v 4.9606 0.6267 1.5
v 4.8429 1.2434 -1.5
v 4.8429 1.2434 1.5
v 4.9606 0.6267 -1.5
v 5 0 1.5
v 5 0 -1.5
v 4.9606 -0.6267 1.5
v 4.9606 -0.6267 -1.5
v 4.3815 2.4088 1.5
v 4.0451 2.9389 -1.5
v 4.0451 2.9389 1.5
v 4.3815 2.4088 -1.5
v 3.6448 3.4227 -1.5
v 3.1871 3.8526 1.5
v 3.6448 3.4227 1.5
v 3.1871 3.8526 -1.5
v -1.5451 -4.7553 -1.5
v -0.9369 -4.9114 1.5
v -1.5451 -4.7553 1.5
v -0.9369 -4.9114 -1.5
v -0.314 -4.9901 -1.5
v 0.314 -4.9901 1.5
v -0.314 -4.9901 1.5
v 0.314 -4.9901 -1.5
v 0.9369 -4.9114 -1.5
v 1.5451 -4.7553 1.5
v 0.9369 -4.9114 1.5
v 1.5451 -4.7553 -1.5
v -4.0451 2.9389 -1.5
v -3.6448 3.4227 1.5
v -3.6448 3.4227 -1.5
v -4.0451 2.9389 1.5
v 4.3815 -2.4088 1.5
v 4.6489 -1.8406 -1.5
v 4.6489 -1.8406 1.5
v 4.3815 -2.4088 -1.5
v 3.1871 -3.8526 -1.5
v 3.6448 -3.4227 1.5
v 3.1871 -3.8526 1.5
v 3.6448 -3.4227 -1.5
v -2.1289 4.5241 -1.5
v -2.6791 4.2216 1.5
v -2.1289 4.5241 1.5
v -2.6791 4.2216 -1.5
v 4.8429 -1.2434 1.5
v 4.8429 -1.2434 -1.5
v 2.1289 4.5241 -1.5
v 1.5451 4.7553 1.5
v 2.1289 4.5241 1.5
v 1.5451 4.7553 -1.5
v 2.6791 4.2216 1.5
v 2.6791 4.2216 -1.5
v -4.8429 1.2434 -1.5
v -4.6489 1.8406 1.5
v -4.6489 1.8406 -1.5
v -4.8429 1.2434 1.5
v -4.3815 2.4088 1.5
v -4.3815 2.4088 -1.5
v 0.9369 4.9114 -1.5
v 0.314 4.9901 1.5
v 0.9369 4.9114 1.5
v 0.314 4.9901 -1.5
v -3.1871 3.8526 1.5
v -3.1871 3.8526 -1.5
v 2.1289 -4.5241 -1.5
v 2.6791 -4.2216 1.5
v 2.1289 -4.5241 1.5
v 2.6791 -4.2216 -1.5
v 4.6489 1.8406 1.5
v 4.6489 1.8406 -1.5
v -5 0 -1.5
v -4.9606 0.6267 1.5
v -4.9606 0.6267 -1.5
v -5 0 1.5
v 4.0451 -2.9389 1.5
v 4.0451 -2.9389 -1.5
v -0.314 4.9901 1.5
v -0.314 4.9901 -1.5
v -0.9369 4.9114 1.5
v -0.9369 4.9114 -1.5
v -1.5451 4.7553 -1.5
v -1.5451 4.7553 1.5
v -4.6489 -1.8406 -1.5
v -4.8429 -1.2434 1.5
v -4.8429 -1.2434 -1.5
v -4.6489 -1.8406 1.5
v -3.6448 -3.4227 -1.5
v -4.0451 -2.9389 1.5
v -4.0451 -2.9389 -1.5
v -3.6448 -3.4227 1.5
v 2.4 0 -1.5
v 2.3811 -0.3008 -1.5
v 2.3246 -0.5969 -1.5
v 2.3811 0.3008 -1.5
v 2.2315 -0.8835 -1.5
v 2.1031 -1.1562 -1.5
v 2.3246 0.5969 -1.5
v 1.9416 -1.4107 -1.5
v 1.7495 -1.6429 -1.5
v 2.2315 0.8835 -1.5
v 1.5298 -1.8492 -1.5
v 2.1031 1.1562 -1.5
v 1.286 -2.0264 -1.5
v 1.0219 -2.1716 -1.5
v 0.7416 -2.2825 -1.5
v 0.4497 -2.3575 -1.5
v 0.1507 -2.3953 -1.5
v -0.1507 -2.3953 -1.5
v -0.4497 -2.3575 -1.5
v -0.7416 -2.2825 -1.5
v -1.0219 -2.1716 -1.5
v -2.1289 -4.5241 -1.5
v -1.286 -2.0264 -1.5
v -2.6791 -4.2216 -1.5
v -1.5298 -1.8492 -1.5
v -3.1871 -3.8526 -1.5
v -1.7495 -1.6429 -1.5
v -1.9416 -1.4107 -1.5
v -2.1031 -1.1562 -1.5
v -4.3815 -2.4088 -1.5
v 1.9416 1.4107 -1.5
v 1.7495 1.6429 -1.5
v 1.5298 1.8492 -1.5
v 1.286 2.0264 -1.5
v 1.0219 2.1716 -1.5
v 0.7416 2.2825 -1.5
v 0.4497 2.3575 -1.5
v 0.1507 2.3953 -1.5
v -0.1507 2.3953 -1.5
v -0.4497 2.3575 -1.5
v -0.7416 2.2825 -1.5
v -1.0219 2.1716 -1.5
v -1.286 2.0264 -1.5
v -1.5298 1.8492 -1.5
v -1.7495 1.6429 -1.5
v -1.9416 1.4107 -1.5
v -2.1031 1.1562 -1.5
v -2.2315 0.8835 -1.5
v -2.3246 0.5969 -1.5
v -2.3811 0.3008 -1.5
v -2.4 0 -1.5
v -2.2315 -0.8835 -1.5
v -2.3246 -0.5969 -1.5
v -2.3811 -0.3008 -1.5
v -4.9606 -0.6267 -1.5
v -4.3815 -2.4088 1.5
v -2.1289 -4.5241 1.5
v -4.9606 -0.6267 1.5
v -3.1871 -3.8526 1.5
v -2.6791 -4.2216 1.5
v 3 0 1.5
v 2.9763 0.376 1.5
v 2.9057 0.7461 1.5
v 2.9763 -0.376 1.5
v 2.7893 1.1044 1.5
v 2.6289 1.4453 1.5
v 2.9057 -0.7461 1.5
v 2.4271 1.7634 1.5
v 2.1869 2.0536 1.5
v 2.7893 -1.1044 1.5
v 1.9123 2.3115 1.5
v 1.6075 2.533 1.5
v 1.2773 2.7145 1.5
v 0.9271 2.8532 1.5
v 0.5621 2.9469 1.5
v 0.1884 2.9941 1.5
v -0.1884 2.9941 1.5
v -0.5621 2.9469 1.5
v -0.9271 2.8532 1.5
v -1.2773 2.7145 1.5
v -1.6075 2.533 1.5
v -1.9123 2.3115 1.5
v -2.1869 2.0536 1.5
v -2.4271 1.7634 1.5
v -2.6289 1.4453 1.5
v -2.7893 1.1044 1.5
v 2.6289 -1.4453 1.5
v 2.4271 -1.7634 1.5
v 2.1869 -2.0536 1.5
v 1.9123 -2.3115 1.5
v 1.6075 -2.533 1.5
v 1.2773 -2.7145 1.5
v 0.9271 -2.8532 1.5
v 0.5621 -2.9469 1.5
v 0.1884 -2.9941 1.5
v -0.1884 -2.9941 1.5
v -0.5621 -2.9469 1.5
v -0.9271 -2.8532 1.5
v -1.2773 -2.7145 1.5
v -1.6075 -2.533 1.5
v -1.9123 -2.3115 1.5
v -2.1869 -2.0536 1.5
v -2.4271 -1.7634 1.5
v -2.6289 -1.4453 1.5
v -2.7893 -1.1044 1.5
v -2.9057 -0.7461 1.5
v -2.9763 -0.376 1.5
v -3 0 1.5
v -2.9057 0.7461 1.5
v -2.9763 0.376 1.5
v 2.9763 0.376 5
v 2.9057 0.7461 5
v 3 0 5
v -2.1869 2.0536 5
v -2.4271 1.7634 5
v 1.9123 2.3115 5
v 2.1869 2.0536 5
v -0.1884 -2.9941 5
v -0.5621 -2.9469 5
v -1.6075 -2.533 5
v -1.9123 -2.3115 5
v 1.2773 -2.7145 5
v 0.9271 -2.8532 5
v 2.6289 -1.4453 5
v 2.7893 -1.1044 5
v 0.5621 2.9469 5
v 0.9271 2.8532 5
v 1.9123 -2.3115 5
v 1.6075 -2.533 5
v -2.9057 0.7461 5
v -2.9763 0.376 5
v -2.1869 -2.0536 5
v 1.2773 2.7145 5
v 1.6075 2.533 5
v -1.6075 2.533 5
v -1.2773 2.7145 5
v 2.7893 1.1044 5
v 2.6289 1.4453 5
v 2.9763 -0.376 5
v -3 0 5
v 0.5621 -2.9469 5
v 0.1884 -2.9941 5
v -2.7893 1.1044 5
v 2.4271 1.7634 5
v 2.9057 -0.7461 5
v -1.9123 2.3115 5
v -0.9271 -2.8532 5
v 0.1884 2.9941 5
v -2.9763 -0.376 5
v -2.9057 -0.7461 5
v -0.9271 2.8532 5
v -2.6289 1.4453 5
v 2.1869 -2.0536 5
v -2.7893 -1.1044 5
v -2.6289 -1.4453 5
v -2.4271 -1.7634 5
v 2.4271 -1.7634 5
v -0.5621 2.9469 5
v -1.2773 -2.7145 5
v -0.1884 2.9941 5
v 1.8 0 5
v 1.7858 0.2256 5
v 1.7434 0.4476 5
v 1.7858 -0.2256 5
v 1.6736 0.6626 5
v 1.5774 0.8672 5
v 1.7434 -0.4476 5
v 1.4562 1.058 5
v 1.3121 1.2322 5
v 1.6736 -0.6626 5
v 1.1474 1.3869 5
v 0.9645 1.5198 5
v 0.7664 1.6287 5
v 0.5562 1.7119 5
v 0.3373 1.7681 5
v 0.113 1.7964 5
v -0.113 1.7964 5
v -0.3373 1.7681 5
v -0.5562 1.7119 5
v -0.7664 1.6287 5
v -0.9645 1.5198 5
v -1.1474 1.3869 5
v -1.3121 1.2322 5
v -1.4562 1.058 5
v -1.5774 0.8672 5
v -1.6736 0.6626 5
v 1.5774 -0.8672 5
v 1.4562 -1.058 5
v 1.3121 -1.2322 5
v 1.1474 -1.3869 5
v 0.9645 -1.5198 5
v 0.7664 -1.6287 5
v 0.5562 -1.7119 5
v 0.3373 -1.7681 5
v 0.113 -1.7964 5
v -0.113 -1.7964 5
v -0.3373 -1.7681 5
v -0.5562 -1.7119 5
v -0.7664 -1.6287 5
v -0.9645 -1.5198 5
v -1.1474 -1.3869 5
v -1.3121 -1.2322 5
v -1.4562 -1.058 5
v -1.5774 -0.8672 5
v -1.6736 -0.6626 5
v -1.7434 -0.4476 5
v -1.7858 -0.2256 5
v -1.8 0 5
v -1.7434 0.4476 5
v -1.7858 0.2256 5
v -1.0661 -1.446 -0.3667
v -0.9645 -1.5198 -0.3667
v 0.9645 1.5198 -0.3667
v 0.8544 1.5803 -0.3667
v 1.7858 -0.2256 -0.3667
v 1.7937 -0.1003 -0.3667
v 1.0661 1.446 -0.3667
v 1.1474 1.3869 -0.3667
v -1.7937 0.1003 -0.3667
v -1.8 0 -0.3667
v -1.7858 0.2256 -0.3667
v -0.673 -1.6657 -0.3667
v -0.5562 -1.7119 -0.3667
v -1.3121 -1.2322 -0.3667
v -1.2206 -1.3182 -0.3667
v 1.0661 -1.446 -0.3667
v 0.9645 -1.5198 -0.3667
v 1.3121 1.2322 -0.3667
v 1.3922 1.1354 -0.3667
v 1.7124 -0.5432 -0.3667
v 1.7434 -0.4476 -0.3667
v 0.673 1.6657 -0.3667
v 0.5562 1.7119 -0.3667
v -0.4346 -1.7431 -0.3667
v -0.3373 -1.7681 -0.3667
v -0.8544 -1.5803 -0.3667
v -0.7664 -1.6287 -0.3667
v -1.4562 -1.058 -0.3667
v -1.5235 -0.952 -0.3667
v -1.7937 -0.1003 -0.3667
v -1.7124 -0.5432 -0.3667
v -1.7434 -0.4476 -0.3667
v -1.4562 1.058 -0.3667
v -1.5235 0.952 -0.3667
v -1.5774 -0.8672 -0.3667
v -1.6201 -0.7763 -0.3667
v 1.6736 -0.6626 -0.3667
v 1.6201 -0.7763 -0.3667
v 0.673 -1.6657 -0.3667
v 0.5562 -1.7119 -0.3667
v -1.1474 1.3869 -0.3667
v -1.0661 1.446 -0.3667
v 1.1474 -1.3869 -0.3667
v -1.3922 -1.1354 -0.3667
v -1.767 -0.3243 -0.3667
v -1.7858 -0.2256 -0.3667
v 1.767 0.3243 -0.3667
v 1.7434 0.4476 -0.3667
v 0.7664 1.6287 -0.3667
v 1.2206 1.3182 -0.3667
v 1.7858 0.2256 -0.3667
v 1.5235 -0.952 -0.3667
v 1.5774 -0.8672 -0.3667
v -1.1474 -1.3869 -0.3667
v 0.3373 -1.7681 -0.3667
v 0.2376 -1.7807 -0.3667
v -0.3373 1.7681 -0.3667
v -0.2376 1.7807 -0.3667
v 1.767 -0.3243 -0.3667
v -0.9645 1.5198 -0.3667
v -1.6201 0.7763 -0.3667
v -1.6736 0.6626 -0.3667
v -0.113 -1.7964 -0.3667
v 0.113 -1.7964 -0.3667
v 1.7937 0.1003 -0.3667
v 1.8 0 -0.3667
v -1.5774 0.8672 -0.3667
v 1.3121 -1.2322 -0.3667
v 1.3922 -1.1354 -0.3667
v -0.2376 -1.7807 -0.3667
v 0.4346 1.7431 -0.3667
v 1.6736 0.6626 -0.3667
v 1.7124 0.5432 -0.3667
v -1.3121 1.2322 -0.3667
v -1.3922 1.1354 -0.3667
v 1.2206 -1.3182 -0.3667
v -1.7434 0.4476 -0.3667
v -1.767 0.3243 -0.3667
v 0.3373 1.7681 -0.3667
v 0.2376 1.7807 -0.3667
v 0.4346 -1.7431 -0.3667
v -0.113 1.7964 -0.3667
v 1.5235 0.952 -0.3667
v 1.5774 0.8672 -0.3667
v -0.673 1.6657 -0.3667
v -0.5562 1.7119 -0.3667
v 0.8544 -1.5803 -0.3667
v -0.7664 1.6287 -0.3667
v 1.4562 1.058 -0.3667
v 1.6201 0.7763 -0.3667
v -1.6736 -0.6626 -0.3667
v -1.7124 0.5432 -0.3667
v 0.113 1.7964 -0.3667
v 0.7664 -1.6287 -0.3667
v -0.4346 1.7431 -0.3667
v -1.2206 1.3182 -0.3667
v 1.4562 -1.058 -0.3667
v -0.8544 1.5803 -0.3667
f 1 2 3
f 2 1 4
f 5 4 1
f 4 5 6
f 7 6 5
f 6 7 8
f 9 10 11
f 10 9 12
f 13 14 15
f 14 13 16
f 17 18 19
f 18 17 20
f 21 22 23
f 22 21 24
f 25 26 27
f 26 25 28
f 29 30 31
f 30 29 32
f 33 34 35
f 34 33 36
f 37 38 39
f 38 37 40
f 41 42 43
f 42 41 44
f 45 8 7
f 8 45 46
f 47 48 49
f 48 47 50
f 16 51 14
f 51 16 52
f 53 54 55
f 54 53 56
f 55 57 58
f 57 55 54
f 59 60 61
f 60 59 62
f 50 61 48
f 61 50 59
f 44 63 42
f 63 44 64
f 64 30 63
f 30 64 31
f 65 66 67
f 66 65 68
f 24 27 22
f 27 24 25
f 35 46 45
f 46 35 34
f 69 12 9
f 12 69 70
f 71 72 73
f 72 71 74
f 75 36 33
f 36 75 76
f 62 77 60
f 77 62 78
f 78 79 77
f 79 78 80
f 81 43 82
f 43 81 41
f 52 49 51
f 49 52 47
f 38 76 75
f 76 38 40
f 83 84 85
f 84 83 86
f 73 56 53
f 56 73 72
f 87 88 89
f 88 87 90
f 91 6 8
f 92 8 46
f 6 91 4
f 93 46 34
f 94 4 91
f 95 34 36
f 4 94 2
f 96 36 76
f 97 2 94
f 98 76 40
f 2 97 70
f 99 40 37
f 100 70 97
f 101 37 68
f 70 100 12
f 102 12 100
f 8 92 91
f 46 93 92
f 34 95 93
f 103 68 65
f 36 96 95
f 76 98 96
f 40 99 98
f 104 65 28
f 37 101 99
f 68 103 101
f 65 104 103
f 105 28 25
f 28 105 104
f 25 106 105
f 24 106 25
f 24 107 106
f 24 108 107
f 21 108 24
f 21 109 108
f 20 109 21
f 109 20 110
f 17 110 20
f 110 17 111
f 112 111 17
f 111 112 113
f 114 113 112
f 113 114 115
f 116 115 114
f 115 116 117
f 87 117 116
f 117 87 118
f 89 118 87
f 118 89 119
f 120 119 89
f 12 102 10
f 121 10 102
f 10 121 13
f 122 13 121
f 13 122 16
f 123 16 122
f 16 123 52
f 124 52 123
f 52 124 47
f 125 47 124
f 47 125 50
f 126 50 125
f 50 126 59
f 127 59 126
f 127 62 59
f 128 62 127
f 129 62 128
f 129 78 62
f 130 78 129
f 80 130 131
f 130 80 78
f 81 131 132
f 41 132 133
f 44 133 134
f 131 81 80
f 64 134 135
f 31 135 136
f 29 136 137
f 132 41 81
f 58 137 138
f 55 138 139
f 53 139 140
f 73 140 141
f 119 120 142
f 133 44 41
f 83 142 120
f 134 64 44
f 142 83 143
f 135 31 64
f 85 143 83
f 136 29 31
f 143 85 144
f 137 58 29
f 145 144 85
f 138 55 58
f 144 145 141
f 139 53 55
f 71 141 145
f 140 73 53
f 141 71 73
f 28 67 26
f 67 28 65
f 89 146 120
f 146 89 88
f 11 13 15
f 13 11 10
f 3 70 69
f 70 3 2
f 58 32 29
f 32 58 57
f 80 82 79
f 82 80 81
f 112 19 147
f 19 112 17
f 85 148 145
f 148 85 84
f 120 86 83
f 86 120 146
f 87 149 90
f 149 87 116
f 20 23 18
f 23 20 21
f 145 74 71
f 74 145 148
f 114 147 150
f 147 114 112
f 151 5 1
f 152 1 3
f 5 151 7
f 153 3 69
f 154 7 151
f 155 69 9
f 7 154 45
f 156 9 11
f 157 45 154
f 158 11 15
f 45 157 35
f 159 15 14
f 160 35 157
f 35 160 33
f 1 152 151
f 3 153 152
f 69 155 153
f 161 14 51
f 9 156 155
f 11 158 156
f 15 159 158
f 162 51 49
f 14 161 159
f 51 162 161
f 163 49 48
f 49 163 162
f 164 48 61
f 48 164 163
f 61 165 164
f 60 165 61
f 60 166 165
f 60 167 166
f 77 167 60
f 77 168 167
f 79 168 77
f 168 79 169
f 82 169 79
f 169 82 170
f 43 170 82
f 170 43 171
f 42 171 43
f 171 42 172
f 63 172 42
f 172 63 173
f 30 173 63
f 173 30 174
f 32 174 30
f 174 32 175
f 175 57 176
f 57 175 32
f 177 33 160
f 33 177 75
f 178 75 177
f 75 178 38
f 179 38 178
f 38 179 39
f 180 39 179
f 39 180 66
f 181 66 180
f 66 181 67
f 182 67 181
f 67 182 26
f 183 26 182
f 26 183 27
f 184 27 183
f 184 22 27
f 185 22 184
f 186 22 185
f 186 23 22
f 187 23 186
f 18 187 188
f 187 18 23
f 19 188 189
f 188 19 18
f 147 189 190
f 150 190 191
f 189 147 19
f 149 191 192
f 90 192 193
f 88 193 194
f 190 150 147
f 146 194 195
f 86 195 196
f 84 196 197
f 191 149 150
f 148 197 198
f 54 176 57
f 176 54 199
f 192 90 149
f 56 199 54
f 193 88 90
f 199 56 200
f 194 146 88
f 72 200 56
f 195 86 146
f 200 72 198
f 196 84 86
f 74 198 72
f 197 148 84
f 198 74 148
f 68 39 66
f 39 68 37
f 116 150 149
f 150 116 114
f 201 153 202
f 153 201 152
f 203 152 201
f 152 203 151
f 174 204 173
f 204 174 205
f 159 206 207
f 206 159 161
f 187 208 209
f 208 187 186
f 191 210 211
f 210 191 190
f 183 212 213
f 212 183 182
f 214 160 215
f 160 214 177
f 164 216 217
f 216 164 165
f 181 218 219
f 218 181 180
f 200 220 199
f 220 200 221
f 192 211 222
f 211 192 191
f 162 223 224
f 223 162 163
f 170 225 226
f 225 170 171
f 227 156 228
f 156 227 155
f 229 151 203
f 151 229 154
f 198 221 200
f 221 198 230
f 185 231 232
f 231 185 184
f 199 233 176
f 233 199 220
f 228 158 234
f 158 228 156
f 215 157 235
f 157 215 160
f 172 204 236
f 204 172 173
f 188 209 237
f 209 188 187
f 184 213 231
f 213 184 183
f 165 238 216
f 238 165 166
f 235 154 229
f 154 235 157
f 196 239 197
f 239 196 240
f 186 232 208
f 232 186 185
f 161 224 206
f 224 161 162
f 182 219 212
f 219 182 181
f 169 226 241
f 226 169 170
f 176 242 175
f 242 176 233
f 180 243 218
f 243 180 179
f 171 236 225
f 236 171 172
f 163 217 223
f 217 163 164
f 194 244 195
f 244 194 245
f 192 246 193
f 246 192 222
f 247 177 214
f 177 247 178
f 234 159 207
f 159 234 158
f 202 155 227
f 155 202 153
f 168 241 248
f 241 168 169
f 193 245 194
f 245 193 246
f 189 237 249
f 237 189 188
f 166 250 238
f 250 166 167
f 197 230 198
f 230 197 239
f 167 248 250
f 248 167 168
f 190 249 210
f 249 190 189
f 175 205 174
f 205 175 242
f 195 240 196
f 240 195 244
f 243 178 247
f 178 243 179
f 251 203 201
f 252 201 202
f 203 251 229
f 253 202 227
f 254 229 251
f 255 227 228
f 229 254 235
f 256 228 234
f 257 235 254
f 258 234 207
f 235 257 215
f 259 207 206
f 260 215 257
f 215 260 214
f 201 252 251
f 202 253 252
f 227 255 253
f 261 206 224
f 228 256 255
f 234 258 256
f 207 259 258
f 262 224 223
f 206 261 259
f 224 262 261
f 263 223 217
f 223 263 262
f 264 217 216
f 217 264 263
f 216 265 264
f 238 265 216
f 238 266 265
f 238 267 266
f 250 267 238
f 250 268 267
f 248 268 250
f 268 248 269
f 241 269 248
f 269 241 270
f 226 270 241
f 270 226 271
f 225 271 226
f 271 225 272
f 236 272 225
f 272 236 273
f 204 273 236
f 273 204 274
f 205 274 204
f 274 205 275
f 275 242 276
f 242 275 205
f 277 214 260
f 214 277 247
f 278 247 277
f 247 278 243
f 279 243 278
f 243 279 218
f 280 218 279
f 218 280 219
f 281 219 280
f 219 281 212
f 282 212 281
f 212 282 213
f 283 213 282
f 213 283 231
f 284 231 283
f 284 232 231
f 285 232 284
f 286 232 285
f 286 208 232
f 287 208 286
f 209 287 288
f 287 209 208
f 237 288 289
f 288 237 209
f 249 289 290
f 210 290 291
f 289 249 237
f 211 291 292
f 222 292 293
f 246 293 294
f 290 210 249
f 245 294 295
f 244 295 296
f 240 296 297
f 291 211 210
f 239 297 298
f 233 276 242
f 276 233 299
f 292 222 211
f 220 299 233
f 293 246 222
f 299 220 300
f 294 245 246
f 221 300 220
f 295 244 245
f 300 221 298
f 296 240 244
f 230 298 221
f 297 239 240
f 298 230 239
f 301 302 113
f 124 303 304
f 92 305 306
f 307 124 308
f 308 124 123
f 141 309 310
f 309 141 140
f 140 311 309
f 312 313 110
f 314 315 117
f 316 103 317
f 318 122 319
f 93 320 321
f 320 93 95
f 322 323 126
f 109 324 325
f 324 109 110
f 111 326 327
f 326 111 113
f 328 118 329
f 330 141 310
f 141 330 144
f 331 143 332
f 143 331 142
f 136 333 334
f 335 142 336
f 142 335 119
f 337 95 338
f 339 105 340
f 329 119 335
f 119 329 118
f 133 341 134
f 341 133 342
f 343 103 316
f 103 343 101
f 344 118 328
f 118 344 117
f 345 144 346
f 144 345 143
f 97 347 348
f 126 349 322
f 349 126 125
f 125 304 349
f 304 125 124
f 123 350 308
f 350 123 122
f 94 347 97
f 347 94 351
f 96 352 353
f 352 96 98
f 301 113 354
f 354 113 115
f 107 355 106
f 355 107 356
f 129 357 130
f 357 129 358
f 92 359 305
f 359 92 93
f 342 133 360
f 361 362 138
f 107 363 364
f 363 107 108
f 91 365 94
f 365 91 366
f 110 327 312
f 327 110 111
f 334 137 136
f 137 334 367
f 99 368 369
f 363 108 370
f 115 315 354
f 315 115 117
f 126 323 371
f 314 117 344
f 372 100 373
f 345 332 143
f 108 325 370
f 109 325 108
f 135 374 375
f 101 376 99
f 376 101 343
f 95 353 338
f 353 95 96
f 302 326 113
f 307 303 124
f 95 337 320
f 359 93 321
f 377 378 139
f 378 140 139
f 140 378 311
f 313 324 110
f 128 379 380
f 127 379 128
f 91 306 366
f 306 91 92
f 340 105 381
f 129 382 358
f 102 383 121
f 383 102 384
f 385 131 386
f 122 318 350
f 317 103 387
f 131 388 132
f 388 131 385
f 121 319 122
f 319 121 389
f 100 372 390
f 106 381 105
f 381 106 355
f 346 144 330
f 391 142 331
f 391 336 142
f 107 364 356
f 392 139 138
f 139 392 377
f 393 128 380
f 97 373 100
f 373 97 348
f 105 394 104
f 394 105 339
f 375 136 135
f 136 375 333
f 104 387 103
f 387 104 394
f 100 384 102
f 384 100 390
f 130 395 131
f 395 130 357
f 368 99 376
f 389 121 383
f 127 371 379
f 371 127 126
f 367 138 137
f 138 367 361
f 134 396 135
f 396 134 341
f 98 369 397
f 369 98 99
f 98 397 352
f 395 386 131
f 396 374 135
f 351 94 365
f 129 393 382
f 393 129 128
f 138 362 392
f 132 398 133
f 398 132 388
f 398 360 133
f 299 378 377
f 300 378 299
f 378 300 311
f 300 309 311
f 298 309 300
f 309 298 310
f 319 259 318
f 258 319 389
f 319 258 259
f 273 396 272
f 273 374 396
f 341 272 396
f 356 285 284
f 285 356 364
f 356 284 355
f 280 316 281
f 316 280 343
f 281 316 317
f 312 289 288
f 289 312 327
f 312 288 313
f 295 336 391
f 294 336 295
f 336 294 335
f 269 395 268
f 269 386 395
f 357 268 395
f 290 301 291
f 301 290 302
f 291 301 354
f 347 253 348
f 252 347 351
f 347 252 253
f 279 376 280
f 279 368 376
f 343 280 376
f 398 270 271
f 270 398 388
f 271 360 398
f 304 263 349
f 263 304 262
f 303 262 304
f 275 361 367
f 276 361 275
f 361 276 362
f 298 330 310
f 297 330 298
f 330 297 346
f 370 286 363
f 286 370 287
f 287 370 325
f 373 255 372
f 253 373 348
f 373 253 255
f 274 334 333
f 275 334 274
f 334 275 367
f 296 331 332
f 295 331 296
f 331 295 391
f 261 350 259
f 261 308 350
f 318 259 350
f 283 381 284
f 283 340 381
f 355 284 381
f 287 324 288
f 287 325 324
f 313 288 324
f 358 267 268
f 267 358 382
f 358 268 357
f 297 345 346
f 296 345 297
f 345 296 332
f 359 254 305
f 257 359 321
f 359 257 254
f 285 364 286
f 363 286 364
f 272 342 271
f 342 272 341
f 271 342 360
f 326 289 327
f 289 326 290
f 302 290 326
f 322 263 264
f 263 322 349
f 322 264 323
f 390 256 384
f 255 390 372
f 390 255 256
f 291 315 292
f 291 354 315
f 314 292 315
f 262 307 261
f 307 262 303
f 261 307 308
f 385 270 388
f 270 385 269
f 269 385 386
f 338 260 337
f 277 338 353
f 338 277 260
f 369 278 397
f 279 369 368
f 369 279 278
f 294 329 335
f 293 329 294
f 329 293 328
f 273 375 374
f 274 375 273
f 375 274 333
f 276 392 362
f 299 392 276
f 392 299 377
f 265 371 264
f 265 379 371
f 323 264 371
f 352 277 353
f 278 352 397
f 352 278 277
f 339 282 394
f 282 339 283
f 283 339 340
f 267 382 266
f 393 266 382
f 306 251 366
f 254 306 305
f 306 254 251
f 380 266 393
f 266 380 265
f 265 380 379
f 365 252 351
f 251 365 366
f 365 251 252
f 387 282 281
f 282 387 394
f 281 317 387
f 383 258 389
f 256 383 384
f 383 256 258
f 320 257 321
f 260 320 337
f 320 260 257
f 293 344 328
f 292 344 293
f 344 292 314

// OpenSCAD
$fn = 50;


difference() {
	union() {
		translate(v = [0, 0, -1.5000000000]) {
			cylinder(h = 3, r = 5.0000000000);
		}
		translate(v = [0, 0, -1.5000000000]) {
			cylinder(h = 6.5000000000, r = 3.0000000000);
		}
	}
	union() {
		translate(v = [0, 0, -1.5000000000]) {
			rotate(a = [0, 180, 0]) {
				difference() {
					union() {
						translate(v = [0, 0, -1.7000000000]) {
							cylinder(h = 1.7000000000, r1 = 1.5000000000, r2 = 2.4000000000);
						}
						translate(v = [0, 0, -6.5000000000]) {
							cylinder(h = 6.5000000000, r = 1.5000000000);
						}
						translate(v = [0, 0, -6.5000000000]) {
							cylinder(h = 6.5000000000, r = 1.8000000000);
						}
						translate(v = [0, 0, -6.5000000000]) {
							cylinder(h = 6.5000000000, r = 1.5000000000);
						}
					}
					union();
				}
			}
		}
		translate(v = [0, 0, -50.0000000000]) {
			cylinder(h = 100, r = 1.5000000000);
		}
	}
}
